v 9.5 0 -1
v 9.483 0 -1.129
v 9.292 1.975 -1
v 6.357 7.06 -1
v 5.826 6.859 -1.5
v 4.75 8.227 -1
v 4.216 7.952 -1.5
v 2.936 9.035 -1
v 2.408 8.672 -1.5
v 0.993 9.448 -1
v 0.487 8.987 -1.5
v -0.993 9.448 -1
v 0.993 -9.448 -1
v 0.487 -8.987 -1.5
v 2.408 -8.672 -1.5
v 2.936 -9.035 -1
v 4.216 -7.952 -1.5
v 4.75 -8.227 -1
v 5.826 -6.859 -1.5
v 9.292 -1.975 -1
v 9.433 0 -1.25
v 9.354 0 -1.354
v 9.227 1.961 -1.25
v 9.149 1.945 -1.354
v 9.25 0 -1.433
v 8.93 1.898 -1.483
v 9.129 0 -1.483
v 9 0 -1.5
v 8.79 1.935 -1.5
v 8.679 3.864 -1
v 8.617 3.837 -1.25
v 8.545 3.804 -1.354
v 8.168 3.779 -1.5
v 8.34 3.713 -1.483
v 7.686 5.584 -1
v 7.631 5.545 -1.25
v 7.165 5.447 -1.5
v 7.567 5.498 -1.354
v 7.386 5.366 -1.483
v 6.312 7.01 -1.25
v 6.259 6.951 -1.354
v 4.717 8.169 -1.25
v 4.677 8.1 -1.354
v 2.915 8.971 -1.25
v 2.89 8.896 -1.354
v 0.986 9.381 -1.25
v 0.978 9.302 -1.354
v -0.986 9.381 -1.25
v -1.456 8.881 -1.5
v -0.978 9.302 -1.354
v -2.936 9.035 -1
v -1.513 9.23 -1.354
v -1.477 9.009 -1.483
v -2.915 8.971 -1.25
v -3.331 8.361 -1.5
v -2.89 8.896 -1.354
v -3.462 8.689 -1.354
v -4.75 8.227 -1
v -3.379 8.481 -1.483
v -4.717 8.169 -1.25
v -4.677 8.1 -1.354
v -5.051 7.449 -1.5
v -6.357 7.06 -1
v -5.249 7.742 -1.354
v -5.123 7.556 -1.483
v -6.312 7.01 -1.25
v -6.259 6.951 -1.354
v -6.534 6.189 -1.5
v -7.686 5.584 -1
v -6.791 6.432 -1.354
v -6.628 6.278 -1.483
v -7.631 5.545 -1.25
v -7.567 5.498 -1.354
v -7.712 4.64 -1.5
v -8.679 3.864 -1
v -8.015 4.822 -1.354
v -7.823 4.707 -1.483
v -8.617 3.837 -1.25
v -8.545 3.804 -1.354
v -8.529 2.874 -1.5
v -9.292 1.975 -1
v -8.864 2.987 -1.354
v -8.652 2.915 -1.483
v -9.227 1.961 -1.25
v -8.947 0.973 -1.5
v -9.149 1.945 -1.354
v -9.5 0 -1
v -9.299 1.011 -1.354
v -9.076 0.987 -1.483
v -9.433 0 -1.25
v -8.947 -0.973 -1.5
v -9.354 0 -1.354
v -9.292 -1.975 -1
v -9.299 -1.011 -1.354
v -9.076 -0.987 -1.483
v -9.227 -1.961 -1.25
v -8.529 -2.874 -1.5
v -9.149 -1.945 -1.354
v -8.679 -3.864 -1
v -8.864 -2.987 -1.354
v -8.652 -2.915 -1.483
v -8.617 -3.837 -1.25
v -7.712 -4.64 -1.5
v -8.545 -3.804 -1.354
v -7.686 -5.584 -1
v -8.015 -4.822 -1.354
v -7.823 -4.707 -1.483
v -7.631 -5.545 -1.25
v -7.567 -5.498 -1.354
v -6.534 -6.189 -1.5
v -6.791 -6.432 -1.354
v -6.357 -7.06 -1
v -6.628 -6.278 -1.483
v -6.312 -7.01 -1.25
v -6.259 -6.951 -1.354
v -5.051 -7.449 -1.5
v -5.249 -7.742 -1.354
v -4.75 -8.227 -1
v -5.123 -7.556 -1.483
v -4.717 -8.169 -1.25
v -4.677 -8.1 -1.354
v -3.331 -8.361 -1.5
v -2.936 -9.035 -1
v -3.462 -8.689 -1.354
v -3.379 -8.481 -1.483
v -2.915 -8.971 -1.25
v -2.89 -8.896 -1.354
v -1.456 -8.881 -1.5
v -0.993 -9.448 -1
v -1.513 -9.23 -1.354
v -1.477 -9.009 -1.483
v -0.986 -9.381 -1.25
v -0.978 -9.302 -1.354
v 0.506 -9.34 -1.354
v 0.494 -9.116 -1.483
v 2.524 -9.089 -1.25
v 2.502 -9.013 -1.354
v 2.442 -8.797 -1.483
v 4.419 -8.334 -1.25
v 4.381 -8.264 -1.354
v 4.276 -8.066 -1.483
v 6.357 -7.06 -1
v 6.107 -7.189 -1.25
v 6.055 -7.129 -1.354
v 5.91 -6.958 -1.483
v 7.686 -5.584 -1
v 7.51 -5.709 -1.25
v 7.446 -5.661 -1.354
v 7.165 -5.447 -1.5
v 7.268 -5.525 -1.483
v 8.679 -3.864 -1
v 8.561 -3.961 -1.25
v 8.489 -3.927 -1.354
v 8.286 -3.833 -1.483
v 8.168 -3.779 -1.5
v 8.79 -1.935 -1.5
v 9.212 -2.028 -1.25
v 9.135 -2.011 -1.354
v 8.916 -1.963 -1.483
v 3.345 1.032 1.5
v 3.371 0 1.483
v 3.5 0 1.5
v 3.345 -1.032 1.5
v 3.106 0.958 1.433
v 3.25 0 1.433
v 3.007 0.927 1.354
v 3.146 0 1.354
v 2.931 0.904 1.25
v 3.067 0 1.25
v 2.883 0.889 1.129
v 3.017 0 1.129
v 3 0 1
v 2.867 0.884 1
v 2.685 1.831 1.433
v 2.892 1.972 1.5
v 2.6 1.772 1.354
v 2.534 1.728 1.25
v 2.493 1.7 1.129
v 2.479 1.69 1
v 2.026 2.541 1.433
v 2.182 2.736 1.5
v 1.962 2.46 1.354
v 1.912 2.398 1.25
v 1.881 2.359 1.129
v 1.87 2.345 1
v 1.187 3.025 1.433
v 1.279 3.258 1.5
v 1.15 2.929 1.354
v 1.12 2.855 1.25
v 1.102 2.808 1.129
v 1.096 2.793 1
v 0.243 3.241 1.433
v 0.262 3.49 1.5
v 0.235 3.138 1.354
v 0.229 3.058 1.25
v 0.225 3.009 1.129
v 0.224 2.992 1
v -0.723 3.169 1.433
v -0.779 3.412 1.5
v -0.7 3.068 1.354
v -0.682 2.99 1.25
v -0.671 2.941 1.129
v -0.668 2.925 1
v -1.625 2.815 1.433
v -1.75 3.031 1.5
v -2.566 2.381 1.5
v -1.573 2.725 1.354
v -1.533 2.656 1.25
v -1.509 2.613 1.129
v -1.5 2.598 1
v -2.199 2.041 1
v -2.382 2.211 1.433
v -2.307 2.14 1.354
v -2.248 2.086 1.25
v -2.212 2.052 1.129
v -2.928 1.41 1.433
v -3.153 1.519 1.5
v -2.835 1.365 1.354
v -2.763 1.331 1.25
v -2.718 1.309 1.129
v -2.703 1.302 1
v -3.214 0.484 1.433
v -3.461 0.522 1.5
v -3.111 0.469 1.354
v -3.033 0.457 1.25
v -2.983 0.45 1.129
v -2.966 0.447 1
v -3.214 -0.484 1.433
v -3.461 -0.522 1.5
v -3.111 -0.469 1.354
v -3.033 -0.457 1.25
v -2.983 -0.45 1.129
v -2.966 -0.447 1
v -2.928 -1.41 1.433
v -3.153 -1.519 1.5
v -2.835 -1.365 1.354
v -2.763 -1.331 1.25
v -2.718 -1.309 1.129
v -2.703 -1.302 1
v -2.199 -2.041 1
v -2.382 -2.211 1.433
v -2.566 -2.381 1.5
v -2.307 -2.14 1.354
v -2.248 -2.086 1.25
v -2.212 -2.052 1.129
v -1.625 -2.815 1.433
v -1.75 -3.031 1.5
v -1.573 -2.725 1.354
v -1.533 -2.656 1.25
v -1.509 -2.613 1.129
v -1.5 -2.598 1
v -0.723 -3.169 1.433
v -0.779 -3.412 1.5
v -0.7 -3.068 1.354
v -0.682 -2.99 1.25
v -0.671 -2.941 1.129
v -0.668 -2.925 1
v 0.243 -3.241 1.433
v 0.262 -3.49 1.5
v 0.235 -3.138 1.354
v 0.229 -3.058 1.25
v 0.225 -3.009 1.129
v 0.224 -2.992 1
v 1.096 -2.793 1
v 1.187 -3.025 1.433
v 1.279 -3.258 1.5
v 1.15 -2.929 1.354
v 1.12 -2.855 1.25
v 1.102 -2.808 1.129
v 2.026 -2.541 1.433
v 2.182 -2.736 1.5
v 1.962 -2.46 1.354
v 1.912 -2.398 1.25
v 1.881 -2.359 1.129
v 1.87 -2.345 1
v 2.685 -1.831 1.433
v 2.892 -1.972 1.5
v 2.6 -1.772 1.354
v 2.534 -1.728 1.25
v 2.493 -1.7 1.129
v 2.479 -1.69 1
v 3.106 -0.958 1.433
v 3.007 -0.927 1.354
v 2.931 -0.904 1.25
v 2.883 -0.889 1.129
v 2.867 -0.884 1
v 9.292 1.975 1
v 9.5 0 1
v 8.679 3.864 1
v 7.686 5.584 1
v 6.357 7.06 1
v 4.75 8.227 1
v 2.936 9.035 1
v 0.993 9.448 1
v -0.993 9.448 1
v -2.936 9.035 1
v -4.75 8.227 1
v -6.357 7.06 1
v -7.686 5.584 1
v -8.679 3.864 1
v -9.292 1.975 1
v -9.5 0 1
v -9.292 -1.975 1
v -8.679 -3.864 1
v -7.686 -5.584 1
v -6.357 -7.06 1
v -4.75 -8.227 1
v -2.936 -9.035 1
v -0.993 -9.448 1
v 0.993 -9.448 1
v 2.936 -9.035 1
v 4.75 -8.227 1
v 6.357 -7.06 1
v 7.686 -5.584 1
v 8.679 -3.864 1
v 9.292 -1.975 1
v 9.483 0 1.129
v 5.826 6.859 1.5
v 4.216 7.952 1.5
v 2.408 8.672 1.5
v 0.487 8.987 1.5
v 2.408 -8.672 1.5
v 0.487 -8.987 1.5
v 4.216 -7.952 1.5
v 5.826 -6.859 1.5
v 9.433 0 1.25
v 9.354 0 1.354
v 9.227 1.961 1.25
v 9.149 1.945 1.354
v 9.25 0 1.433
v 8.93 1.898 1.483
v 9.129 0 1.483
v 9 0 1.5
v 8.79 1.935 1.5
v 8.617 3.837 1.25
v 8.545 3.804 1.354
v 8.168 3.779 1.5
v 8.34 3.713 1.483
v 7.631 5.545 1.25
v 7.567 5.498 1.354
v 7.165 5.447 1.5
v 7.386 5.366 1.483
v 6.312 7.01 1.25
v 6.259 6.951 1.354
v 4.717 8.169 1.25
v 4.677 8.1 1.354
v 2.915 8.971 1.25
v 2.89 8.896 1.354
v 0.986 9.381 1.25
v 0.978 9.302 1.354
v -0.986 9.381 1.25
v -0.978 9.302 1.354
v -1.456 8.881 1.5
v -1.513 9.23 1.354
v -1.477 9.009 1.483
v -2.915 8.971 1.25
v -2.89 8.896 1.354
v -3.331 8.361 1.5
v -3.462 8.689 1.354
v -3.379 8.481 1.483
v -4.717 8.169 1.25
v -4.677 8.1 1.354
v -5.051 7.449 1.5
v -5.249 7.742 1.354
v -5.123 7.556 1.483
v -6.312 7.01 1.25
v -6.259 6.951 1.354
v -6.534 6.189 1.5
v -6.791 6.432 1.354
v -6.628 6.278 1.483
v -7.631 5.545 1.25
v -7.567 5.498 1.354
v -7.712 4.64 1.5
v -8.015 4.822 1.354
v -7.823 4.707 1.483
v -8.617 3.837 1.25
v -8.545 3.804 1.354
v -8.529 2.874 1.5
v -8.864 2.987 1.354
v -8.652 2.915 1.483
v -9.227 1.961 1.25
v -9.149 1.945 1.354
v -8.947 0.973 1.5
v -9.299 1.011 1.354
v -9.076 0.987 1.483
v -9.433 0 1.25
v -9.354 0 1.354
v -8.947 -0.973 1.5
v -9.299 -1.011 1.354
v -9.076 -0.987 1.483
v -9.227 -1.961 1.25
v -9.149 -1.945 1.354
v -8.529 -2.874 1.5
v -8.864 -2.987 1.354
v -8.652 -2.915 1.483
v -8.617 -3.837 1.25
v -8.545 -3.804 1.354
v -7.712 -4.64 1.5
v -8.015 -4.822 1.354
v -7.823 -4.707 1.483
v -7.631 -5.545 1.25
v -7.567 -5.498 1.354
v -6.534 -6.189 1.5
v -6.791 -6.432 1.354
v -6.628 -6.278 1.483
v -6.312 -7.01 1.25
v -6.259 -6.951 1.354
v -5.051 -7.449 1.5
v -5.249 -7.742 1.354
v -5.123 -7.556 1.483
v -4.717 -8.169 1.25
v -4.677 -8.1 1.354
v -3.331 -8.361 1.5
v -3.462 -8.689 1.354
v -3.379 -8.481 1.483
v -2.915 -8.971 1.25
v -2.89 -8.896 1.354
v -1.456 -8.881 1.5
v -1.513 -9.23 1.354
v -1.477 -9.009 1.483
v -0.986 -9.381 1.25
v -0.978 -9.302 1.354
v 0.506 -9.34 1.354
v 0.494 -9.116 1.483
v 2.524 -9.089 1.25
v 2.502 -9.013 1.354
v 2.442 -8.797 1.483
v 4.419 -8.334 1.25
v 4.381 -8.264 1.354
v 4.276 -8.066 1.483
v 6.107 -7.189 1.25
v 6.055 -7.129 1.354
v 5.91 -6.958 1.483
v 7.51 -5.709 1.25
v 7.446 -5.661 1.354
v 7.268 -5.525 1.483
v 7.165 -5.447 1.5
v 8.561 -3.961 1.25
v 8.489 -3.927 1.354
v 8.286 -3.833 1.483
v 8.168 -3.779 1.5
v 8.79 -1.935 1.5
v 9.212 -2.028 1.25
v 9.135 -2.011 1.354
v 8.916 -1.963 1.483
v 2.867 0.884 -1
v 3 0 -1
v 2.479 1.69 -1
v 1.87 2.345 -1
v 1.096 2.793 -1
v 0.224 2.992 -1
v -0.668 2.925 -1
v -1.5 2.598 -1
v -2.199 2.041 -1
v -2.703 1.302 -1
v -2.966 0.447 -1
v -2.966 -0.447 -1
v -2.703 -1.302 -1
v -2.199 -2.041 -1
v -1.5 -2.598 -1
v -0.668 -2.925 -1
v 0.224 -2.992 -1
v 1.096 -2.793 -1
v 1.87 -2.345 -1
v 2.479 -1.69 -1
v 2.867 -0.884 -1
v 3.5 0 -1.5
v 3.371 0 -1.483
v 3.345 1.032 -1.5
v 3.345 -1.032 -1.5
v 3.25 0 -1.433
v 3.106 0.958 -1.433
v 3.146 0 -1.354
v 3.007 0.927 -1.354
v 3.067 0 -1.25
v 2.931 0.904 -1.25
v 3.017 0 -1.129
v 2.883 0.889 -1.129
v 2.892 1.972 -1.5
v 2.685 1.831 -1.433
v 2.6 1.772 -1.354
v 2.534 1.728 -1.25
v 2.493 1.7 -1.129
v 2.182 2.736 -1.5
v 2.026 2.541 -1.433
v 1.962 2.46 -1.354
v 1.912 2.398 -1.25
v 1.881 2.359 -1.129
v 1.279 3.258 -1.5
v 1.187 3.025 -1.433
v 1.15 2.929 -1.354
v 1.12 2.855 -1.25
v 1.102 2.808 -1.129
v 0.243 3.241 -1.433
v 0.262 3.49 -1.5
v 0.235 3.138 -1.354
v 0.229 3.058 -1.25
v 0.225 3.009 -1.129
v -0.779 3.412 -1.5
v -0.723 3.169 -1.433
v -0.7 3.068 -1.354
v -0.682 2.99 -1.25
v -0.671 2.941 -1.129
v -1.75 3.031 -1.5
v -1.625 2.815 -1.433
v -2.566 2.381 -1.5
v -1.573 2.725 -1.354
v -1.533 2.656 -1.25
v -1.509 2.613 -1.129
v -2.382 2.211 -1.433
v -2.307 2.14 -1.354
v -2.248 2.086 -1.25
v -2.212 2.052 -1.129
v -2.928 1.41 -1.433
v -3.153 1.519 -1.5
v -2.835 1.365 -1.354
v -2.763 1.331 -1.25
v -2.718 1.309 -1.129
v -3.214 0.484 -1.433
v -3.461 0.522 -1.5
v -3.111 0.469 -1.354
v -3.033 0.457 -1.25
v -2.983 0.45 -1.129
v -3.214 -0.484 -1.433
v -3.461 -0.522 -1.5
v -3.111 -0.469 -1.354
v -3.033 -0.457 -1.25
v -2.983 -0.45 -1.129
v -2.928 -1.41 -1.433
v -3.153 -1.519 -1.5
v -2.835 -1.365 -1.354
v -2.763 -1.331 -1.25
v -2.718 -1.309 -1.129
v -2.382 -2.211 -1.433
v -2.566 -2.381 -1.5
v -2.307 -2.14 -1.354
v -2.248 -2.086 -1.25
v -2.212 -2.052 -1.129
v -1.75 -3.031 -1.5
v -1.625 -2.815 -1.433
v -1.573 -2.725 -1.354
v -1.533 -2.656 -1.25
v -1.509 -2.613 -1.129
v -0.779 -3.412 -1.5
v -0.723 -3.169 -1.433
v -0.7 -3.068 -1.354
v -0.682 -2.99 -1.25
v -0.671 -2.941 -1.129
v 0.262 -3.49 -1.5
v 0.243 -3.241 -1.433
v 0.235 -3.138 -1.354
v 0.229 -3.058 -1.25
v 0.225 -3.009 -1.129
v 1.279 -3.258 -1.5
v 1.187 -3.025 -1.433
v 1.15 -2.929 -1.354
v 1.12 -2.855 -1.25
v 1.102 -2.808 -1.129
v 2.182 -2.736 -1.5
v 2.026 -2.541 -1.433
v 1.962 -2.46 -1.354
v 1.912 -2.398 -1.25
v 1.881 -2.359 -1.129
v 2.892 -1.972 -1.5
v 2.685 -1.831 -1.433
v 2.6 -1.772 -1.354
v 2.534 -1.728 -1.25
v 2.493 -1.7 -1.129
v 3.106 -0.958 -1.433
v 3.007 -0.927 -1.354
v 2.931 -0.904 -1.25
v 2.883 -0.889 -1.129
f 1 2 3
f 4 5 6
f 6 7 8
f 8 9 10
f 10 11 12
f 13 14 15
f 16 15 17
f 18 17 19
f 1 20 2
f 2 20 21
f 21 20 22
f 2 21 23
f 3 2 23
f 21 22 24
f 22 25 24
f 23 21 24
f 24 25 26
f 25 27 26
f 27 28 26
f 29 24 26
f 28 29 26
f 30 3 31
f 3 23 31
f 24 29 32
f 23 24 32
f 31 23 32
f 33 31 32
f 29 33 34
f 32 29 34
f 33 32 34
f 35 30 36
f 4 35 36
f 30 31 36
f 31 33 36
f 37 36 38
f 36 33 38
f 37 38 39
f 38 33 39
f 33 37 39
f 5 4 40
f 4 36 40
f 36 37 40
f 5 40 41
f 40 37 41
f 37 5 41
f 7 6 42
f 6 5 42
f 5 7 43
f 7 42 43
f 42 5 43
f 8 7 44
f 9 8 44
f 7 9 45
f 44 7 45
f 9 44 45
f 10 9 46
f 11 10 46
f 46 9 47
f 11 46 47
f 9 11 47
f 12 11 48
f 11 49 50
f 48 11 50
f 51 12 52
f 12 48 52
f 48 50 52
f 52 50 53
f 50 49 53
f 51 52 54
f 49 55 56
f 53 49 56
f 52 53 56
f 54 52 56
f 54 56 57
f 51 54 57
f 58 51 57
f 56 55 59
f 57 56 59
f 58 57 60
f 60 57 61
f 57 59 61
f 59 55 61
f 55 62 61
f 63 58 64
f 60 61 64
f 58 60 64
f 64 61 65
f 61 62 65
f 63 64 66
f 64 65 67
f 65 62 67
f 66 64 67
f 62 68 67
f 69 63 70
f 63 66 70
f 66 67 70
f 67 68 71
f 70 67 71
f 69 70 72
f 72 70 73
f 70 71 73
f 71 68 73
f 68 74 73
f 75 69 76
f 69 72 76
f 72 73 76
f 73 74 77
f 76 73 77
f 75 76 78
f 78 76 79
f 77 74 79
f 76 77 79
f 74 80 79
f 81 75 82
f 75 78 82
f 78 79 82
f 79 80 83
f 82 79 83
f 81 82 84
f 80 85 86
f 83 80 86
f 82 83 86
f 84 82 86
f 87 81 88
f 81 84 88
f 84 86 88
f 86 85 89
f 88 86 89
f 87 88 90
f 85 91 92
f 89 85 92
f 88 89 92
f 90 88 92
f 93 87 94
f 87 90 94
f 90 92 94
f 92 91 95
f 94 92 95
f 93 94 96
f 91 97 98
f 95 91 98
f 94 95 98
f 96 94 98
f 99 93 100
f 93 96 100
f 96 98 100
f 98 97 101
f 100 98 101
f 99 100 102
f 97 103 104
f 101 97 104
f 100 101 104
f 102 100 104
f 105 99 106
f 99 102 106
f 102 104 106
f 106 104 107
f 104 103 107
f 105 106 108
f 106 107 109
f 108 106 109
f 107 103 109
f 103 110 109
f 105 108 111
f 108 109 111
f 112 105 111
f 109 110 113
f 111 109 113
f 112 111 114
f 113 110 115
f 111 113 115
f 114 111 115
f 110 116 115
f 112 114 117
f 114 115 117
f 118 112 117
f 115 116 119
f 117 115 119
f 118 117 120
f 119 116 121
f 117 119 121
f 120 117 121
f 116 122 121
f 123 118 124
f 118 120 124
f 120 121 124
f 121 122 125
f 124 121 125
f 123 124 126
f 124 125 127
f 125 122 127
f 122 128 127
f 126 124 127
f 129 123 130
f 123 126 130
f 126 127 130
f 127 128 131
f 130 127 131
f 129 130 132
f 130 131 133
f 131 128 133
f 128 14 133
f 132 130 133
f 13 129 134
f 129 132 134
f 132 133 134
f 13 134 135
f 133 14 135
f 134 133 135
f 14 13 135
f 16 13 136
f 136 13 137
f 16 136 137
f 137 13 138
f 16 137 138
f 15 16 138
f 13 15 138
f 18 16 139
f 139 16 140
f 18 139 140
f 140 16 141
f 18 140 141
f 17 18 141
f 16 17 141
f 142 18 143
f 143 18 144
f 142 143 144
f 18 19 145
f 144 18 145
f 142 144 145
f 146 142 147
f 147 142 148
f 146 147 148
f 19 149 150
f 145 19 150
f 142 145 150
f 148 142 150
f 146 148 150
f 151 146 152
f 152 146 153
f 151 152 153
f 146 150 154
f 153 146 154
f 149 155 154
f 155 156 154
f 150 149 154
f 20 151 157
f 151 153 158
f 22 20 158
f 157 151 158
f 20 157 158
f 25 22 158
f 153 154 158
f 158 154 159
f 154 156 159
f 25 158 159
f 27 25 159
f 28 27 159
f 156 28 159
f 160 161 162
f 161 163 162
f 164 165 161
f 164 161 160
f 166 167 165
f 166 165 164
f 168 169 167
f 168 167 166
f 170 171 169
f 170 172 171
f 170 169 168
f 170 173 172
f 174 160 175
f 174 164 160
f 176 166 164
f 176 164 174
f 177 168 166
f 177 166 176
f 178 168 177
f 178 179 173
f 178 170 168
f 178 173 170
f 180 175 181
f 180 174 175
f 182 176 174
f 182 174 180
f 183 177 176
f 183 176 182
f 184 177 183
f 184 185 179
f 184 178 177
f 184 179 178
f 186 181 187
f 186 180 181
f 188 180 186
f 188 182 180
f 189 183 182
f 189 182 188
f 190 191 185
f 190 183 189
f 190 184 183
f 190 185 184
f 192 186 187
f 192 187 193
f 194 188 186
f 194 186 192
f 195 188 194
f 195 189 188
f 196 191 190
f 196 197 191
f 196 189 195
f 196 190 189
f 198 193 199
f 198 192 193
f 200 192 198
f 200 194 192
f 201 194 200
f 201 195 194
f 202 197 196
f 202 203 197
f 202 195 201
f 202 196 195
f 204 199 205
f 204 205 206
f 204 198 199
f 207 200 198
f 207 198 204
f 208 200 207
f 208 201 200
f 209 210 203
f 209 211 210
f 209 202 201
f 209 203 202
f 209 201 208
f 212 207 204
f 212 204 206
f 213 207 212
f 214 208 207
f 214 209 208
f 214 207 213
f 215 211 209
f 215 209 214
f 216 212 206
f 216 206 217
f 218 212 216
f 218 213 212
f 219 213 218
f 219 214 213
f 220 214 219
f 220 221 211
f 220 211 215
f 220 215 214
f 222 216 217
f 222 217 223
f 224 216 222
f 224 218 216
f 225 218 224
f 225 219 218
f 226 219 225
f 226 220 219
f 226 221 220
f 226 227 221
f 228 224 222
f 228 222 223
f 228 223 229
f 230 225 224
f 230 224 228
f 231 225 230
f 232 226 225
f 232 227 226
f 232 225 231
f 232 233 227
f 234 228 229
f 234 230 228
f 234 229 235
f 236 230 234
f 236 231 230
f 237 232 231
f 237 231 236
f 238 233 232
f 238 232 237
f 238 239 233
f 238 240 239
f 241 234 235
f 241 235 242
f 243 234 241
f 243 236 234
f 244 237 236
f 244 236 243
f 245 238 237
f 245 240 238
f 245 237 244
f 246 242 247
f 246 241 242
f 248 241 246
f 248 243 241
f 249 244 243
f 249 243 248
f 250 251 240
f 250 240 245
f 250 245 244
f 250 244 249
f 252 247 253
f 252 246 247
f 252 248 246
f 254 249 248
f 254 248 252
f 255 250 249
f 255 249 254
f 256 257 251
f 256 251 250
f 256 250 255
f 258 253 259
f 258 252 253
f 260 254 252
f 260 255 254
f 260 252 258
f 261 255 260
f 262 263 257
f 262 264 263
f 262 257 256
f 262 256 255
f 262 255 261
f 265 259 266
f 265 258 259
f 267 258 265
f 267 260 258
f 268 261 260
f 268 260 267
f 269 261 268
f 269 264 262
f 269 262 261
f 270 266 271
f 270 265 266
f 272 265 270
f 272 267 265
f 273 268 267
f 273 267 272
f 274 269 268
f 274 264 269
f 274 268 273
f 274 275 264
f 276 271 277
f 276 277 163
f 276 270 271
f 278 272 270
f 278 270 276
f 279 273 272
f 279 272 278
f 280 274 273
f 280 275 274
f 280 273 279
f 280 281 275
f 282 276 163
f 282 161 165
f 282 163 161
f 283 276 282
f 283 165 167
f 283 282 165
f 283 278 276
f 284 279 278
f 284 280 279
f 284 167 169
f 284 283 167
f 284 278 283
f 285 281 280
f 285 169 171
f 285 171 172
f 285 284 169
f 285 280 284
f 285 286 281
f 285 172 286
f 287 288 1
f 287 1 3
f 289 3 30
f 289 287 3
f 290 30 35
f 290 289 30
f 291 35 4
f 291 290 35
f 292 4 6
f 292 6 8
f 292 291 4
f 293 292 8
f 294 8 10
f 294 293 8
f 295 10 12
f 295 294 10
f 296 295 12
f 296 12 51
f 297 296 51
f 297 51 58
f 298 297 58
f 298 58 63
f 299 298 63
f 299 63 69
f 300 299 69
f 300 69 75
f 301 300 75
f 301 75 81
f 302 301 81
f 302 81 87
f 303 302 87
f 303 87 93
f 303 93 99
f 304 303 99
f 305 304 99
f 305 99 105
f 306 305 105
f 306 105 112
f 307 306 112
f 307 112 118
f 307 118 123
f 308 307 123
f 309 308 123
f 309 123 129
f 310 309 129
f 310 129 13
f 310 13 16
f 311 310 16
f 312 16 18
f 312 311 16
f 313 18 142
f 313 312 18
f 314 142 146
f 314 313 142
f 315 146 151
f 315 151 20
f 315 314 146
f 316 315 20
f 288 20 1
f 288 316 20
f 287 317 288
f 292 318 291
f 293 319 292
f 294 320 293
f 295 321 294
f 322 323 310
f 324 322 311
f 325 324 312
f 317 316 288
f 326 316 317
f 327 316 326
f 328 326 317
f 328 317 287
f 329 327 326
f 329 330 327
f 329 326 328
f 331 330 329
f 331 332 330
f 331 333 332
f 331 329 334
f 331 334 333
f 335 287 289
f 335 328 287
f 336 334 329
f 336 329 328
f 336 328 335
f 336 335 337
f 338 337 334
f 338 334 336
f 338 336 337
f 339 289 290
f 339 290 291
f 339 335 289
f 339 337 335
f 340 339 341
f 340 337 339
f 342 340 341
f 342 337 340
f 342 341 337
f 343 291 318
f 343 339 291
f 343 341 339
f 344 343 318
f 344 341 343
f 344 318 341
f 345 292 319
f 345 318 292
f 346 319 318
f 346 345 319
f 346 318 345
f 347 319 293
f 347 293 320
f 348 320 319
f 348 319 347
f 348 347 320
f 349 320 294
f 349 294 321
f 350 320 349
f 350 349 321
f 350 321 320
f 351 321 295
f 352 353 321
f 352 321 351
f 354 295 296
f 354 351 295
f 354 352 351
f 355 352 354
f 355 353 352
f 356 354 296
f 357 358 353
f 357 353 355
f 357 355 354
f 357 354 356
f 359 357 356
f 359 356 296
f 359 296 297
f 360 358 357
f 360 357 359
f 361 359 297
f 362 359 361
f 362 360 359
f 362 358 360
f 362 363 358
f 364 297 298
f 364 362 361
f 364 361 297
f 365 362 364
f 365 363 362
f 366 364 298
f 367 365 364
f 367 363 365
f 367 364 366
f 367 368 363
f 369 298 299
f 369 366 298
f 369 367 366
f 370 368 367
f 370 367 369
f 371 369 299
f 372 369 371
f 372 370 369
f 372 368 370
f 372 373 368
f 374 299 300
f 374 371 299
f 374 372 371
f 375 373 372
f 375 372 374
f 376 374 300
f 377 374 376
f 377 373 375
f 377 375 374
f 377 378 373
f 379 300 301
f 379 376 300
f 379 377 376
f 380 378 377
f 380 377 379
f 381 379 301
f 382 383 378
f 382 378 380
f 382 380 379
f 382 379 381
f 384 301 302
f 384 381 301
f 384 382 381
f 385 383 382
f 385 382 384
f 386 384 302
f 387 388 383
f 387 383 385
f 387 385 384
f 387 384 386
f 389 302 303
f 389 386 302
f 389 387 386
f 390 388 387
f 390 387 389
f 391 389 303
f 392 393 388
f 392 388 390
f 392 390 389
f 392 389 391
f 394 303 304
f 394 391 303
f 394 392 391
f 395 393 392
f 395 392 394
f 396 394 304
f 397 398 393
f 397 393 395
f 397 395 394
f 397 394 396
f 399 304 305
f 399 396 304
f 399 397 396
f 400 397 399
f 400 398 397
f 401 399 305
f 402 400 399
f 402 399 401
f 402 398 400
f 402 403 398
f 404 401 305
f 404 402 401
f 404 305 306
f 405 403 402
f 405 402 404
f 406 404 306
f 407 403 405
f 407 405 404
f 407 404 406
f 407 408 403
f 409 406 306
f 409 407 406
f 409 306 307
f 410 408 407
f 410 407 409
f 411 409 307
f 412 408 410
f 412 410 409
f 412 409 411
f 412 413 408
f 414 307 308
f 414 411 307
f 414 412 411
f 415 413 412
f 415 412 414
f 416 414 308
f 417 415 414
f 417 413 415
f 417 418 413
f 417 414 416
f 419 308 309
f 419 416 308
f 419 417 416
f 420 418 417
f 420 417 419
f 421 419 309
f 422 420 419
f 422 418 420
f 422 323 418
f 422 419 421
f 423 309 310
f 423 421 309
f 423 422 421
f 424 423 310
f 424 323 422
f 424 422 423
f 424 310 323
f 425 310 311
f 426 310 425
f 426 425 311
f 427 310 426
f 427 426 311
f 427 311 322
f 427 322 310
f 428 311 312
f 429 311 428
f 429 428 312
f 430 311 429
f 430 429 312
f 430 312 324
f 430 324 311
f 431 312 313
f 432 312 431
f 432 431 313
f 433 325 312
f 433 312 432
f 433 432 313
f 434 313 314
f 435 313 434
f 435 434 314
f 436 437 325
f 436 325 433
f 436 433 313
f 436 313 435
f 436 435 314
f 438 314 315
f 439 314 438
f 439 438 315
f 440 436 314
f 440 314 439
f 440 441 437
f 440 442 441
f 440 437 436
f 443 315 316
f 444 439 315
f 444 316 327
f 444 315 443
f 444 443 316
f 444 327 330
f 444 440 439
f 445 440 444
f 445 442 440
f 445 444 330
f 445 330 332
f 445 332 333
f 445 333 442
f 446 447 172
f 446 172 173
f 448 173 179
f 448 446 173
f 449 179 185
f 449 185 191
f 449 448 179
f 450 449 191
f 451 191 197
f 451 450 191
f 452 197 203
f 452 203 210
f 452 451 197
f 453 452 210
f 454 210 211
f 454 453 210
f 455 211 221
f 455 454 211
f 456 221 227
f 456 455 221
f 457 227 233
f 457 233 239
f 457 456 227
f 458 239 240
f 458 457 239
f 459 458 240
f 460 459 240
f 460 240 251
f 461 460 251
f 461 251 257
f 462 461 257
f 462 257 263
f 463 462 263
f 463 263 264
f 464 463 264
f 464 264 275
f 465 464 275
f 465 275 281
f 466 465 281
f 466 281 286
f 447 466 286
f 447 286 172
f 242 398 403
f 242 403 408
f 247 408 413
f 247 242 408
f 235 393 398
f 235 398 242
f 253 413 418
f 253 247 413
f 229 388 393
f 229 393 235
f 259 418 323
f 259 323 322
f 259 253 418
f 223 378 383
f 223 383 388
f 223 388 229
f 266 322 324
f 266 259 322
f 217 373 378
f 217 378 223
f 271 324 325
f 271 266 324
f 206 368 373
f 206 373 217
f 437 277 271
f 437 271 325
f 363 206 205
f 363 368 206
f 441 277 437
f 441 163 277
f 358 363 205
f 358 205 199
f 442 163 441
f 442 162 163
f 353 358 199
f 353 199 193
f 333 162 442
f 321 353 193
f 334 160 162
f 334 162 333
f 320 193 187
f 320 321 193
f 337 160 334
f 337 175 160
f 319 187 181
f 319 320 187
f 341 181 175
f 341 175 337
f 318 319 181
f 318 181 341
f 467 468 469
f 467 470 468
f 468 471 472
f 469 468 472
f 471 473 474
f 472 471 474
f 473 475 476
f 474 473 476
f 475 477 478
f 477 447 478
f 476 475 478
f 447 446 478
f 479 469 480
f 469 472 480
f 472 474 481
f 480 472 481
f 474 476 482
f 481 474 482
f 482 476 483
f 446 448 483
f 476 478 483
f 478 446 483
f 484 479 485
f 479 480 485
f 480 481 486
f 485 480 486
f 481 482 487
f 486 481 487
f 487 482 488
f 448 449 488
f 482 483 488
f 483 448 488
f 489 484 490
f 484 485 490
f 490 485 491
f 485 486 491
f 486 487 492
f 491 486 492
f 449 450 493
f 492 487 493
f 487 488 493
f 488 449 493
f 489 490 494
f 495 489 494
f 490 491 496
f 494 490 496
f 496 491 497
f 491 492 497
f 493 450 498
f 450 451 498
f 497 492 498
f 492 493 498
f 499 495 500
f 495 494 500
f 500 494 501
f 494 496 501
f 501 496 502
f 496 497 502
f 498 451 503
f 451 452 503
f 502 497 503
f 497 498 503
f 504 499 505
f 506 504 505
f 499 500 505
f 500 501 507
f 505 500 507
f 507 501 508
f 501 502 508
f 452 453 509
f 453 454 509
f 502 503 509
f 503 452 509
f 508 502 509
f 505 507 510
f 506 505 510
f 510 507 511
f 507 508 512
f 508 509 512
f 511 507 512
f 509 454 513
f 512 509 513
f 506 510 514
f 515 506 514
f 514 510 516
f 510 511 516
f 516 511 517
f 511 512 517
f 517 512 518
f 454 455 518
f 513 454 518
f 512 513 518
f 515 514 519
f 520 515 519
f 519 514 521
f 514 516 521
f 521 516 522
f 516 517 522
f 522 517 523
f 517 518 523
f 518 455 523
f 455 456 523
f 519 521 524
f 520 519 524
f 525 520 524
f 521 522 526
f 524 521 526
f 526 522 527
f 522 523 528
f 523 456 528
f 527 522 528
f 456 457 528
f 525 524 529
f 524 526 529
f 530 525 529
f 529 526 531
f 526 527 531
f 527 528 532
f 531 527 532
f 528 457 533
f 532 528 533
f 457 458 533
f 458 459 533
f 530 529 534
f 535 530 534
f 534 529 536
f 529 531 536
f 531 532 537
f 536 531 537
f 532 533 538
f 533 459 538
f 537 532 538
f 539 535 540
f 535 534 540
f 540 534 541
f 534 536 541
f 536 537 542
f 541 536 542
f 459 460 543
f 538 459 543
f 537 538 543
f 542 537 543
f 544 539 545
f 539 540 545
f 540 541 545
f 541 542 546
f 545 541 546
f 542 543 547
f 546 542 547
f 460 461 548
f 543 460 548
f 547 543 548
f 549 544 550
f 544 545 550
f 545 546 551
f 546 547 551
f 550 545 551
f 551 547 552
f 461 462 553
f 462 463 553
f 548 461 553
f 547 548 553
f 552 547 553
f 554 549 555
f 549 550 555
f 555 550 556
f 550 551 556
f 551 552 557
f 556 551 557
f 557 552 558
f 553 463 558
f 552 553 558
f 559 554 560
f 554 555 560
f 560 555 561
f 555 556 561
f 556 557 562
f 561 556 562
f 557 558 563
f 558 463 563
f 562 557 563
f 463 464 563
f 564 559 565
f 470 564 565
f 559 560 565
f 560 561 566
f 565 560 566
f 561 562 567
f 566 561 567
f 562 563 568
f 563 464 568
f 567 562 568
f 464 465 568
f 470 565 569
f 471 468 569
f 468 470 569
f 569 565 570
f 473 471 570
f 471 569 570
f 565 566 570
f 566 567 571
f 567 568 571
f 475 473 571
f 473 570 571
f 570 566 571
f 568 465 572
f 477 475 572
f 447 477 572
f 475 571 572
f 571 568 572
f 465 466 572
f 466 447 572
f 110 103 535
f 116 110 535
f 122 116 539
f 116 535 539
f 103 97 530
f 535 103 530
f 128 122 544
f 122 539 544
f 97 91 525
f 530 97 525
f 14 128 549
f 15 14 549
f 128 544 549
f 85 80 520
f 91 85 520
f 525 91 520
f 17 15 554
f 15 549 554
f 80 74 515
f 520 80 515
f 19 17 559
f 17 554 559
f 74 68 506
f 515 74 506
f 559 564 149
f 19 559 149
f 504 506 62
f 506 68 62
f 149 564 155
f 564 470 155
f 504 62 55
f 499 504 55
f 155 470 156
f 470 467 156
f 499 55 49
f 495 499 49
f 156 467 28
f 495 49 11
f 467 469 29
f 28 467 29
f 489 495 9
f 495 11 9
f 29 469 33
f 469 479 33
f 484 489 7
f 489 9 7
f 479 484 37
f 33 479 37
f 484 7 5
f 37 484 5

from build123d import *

# Parameters (mm, degrees)
ESBO_O1_R                = 9.5
ESBO_O1_R_2              = 3
RESSALTO_EXTRUS_O1_DEPTH = 1.5
FILETE1_R                = 0.5
FILETE2_R                = 0.5
FILETE3_R                = 0.5


with BuildPart() as part:
    # Esboço1 → Ressalto-extrusão1 (new, symmetric)
    with BuildSketch(Plane.XY):
        Circle(ESBO_O1_R)
        Circle(ESBO_O1_R_2, mode=Mode.SUBTRACT)
    extrude(amount=RESSALTO_EXTRUS_O1_DEPTH, both=True)

    # Filete1
    filete1_edges = [part.edges().sort_by_distance(p)[0] for p in [
        (-9.5, 0, 1.5),
    ]]
    fillet(filete1_edges, radius=FILETE1_R)

    # Filete2
    filete2_edges = [part.edges().sort_by_distance(p)[0] for p in [
        (-9.5, 0, -1.5),
    ]]
    fillet(filete2_edges, radius=FILETE2_R)

    # Filete3
    filete3_edges = [part.edges().sort_by_distance(p)[0] for p in [
        (-3, 0, -1.5),
        (-3, 0, 1.5),
    ]]
    fillet(filete3_edges, radius=FILETE3_R)


solid = part.part
